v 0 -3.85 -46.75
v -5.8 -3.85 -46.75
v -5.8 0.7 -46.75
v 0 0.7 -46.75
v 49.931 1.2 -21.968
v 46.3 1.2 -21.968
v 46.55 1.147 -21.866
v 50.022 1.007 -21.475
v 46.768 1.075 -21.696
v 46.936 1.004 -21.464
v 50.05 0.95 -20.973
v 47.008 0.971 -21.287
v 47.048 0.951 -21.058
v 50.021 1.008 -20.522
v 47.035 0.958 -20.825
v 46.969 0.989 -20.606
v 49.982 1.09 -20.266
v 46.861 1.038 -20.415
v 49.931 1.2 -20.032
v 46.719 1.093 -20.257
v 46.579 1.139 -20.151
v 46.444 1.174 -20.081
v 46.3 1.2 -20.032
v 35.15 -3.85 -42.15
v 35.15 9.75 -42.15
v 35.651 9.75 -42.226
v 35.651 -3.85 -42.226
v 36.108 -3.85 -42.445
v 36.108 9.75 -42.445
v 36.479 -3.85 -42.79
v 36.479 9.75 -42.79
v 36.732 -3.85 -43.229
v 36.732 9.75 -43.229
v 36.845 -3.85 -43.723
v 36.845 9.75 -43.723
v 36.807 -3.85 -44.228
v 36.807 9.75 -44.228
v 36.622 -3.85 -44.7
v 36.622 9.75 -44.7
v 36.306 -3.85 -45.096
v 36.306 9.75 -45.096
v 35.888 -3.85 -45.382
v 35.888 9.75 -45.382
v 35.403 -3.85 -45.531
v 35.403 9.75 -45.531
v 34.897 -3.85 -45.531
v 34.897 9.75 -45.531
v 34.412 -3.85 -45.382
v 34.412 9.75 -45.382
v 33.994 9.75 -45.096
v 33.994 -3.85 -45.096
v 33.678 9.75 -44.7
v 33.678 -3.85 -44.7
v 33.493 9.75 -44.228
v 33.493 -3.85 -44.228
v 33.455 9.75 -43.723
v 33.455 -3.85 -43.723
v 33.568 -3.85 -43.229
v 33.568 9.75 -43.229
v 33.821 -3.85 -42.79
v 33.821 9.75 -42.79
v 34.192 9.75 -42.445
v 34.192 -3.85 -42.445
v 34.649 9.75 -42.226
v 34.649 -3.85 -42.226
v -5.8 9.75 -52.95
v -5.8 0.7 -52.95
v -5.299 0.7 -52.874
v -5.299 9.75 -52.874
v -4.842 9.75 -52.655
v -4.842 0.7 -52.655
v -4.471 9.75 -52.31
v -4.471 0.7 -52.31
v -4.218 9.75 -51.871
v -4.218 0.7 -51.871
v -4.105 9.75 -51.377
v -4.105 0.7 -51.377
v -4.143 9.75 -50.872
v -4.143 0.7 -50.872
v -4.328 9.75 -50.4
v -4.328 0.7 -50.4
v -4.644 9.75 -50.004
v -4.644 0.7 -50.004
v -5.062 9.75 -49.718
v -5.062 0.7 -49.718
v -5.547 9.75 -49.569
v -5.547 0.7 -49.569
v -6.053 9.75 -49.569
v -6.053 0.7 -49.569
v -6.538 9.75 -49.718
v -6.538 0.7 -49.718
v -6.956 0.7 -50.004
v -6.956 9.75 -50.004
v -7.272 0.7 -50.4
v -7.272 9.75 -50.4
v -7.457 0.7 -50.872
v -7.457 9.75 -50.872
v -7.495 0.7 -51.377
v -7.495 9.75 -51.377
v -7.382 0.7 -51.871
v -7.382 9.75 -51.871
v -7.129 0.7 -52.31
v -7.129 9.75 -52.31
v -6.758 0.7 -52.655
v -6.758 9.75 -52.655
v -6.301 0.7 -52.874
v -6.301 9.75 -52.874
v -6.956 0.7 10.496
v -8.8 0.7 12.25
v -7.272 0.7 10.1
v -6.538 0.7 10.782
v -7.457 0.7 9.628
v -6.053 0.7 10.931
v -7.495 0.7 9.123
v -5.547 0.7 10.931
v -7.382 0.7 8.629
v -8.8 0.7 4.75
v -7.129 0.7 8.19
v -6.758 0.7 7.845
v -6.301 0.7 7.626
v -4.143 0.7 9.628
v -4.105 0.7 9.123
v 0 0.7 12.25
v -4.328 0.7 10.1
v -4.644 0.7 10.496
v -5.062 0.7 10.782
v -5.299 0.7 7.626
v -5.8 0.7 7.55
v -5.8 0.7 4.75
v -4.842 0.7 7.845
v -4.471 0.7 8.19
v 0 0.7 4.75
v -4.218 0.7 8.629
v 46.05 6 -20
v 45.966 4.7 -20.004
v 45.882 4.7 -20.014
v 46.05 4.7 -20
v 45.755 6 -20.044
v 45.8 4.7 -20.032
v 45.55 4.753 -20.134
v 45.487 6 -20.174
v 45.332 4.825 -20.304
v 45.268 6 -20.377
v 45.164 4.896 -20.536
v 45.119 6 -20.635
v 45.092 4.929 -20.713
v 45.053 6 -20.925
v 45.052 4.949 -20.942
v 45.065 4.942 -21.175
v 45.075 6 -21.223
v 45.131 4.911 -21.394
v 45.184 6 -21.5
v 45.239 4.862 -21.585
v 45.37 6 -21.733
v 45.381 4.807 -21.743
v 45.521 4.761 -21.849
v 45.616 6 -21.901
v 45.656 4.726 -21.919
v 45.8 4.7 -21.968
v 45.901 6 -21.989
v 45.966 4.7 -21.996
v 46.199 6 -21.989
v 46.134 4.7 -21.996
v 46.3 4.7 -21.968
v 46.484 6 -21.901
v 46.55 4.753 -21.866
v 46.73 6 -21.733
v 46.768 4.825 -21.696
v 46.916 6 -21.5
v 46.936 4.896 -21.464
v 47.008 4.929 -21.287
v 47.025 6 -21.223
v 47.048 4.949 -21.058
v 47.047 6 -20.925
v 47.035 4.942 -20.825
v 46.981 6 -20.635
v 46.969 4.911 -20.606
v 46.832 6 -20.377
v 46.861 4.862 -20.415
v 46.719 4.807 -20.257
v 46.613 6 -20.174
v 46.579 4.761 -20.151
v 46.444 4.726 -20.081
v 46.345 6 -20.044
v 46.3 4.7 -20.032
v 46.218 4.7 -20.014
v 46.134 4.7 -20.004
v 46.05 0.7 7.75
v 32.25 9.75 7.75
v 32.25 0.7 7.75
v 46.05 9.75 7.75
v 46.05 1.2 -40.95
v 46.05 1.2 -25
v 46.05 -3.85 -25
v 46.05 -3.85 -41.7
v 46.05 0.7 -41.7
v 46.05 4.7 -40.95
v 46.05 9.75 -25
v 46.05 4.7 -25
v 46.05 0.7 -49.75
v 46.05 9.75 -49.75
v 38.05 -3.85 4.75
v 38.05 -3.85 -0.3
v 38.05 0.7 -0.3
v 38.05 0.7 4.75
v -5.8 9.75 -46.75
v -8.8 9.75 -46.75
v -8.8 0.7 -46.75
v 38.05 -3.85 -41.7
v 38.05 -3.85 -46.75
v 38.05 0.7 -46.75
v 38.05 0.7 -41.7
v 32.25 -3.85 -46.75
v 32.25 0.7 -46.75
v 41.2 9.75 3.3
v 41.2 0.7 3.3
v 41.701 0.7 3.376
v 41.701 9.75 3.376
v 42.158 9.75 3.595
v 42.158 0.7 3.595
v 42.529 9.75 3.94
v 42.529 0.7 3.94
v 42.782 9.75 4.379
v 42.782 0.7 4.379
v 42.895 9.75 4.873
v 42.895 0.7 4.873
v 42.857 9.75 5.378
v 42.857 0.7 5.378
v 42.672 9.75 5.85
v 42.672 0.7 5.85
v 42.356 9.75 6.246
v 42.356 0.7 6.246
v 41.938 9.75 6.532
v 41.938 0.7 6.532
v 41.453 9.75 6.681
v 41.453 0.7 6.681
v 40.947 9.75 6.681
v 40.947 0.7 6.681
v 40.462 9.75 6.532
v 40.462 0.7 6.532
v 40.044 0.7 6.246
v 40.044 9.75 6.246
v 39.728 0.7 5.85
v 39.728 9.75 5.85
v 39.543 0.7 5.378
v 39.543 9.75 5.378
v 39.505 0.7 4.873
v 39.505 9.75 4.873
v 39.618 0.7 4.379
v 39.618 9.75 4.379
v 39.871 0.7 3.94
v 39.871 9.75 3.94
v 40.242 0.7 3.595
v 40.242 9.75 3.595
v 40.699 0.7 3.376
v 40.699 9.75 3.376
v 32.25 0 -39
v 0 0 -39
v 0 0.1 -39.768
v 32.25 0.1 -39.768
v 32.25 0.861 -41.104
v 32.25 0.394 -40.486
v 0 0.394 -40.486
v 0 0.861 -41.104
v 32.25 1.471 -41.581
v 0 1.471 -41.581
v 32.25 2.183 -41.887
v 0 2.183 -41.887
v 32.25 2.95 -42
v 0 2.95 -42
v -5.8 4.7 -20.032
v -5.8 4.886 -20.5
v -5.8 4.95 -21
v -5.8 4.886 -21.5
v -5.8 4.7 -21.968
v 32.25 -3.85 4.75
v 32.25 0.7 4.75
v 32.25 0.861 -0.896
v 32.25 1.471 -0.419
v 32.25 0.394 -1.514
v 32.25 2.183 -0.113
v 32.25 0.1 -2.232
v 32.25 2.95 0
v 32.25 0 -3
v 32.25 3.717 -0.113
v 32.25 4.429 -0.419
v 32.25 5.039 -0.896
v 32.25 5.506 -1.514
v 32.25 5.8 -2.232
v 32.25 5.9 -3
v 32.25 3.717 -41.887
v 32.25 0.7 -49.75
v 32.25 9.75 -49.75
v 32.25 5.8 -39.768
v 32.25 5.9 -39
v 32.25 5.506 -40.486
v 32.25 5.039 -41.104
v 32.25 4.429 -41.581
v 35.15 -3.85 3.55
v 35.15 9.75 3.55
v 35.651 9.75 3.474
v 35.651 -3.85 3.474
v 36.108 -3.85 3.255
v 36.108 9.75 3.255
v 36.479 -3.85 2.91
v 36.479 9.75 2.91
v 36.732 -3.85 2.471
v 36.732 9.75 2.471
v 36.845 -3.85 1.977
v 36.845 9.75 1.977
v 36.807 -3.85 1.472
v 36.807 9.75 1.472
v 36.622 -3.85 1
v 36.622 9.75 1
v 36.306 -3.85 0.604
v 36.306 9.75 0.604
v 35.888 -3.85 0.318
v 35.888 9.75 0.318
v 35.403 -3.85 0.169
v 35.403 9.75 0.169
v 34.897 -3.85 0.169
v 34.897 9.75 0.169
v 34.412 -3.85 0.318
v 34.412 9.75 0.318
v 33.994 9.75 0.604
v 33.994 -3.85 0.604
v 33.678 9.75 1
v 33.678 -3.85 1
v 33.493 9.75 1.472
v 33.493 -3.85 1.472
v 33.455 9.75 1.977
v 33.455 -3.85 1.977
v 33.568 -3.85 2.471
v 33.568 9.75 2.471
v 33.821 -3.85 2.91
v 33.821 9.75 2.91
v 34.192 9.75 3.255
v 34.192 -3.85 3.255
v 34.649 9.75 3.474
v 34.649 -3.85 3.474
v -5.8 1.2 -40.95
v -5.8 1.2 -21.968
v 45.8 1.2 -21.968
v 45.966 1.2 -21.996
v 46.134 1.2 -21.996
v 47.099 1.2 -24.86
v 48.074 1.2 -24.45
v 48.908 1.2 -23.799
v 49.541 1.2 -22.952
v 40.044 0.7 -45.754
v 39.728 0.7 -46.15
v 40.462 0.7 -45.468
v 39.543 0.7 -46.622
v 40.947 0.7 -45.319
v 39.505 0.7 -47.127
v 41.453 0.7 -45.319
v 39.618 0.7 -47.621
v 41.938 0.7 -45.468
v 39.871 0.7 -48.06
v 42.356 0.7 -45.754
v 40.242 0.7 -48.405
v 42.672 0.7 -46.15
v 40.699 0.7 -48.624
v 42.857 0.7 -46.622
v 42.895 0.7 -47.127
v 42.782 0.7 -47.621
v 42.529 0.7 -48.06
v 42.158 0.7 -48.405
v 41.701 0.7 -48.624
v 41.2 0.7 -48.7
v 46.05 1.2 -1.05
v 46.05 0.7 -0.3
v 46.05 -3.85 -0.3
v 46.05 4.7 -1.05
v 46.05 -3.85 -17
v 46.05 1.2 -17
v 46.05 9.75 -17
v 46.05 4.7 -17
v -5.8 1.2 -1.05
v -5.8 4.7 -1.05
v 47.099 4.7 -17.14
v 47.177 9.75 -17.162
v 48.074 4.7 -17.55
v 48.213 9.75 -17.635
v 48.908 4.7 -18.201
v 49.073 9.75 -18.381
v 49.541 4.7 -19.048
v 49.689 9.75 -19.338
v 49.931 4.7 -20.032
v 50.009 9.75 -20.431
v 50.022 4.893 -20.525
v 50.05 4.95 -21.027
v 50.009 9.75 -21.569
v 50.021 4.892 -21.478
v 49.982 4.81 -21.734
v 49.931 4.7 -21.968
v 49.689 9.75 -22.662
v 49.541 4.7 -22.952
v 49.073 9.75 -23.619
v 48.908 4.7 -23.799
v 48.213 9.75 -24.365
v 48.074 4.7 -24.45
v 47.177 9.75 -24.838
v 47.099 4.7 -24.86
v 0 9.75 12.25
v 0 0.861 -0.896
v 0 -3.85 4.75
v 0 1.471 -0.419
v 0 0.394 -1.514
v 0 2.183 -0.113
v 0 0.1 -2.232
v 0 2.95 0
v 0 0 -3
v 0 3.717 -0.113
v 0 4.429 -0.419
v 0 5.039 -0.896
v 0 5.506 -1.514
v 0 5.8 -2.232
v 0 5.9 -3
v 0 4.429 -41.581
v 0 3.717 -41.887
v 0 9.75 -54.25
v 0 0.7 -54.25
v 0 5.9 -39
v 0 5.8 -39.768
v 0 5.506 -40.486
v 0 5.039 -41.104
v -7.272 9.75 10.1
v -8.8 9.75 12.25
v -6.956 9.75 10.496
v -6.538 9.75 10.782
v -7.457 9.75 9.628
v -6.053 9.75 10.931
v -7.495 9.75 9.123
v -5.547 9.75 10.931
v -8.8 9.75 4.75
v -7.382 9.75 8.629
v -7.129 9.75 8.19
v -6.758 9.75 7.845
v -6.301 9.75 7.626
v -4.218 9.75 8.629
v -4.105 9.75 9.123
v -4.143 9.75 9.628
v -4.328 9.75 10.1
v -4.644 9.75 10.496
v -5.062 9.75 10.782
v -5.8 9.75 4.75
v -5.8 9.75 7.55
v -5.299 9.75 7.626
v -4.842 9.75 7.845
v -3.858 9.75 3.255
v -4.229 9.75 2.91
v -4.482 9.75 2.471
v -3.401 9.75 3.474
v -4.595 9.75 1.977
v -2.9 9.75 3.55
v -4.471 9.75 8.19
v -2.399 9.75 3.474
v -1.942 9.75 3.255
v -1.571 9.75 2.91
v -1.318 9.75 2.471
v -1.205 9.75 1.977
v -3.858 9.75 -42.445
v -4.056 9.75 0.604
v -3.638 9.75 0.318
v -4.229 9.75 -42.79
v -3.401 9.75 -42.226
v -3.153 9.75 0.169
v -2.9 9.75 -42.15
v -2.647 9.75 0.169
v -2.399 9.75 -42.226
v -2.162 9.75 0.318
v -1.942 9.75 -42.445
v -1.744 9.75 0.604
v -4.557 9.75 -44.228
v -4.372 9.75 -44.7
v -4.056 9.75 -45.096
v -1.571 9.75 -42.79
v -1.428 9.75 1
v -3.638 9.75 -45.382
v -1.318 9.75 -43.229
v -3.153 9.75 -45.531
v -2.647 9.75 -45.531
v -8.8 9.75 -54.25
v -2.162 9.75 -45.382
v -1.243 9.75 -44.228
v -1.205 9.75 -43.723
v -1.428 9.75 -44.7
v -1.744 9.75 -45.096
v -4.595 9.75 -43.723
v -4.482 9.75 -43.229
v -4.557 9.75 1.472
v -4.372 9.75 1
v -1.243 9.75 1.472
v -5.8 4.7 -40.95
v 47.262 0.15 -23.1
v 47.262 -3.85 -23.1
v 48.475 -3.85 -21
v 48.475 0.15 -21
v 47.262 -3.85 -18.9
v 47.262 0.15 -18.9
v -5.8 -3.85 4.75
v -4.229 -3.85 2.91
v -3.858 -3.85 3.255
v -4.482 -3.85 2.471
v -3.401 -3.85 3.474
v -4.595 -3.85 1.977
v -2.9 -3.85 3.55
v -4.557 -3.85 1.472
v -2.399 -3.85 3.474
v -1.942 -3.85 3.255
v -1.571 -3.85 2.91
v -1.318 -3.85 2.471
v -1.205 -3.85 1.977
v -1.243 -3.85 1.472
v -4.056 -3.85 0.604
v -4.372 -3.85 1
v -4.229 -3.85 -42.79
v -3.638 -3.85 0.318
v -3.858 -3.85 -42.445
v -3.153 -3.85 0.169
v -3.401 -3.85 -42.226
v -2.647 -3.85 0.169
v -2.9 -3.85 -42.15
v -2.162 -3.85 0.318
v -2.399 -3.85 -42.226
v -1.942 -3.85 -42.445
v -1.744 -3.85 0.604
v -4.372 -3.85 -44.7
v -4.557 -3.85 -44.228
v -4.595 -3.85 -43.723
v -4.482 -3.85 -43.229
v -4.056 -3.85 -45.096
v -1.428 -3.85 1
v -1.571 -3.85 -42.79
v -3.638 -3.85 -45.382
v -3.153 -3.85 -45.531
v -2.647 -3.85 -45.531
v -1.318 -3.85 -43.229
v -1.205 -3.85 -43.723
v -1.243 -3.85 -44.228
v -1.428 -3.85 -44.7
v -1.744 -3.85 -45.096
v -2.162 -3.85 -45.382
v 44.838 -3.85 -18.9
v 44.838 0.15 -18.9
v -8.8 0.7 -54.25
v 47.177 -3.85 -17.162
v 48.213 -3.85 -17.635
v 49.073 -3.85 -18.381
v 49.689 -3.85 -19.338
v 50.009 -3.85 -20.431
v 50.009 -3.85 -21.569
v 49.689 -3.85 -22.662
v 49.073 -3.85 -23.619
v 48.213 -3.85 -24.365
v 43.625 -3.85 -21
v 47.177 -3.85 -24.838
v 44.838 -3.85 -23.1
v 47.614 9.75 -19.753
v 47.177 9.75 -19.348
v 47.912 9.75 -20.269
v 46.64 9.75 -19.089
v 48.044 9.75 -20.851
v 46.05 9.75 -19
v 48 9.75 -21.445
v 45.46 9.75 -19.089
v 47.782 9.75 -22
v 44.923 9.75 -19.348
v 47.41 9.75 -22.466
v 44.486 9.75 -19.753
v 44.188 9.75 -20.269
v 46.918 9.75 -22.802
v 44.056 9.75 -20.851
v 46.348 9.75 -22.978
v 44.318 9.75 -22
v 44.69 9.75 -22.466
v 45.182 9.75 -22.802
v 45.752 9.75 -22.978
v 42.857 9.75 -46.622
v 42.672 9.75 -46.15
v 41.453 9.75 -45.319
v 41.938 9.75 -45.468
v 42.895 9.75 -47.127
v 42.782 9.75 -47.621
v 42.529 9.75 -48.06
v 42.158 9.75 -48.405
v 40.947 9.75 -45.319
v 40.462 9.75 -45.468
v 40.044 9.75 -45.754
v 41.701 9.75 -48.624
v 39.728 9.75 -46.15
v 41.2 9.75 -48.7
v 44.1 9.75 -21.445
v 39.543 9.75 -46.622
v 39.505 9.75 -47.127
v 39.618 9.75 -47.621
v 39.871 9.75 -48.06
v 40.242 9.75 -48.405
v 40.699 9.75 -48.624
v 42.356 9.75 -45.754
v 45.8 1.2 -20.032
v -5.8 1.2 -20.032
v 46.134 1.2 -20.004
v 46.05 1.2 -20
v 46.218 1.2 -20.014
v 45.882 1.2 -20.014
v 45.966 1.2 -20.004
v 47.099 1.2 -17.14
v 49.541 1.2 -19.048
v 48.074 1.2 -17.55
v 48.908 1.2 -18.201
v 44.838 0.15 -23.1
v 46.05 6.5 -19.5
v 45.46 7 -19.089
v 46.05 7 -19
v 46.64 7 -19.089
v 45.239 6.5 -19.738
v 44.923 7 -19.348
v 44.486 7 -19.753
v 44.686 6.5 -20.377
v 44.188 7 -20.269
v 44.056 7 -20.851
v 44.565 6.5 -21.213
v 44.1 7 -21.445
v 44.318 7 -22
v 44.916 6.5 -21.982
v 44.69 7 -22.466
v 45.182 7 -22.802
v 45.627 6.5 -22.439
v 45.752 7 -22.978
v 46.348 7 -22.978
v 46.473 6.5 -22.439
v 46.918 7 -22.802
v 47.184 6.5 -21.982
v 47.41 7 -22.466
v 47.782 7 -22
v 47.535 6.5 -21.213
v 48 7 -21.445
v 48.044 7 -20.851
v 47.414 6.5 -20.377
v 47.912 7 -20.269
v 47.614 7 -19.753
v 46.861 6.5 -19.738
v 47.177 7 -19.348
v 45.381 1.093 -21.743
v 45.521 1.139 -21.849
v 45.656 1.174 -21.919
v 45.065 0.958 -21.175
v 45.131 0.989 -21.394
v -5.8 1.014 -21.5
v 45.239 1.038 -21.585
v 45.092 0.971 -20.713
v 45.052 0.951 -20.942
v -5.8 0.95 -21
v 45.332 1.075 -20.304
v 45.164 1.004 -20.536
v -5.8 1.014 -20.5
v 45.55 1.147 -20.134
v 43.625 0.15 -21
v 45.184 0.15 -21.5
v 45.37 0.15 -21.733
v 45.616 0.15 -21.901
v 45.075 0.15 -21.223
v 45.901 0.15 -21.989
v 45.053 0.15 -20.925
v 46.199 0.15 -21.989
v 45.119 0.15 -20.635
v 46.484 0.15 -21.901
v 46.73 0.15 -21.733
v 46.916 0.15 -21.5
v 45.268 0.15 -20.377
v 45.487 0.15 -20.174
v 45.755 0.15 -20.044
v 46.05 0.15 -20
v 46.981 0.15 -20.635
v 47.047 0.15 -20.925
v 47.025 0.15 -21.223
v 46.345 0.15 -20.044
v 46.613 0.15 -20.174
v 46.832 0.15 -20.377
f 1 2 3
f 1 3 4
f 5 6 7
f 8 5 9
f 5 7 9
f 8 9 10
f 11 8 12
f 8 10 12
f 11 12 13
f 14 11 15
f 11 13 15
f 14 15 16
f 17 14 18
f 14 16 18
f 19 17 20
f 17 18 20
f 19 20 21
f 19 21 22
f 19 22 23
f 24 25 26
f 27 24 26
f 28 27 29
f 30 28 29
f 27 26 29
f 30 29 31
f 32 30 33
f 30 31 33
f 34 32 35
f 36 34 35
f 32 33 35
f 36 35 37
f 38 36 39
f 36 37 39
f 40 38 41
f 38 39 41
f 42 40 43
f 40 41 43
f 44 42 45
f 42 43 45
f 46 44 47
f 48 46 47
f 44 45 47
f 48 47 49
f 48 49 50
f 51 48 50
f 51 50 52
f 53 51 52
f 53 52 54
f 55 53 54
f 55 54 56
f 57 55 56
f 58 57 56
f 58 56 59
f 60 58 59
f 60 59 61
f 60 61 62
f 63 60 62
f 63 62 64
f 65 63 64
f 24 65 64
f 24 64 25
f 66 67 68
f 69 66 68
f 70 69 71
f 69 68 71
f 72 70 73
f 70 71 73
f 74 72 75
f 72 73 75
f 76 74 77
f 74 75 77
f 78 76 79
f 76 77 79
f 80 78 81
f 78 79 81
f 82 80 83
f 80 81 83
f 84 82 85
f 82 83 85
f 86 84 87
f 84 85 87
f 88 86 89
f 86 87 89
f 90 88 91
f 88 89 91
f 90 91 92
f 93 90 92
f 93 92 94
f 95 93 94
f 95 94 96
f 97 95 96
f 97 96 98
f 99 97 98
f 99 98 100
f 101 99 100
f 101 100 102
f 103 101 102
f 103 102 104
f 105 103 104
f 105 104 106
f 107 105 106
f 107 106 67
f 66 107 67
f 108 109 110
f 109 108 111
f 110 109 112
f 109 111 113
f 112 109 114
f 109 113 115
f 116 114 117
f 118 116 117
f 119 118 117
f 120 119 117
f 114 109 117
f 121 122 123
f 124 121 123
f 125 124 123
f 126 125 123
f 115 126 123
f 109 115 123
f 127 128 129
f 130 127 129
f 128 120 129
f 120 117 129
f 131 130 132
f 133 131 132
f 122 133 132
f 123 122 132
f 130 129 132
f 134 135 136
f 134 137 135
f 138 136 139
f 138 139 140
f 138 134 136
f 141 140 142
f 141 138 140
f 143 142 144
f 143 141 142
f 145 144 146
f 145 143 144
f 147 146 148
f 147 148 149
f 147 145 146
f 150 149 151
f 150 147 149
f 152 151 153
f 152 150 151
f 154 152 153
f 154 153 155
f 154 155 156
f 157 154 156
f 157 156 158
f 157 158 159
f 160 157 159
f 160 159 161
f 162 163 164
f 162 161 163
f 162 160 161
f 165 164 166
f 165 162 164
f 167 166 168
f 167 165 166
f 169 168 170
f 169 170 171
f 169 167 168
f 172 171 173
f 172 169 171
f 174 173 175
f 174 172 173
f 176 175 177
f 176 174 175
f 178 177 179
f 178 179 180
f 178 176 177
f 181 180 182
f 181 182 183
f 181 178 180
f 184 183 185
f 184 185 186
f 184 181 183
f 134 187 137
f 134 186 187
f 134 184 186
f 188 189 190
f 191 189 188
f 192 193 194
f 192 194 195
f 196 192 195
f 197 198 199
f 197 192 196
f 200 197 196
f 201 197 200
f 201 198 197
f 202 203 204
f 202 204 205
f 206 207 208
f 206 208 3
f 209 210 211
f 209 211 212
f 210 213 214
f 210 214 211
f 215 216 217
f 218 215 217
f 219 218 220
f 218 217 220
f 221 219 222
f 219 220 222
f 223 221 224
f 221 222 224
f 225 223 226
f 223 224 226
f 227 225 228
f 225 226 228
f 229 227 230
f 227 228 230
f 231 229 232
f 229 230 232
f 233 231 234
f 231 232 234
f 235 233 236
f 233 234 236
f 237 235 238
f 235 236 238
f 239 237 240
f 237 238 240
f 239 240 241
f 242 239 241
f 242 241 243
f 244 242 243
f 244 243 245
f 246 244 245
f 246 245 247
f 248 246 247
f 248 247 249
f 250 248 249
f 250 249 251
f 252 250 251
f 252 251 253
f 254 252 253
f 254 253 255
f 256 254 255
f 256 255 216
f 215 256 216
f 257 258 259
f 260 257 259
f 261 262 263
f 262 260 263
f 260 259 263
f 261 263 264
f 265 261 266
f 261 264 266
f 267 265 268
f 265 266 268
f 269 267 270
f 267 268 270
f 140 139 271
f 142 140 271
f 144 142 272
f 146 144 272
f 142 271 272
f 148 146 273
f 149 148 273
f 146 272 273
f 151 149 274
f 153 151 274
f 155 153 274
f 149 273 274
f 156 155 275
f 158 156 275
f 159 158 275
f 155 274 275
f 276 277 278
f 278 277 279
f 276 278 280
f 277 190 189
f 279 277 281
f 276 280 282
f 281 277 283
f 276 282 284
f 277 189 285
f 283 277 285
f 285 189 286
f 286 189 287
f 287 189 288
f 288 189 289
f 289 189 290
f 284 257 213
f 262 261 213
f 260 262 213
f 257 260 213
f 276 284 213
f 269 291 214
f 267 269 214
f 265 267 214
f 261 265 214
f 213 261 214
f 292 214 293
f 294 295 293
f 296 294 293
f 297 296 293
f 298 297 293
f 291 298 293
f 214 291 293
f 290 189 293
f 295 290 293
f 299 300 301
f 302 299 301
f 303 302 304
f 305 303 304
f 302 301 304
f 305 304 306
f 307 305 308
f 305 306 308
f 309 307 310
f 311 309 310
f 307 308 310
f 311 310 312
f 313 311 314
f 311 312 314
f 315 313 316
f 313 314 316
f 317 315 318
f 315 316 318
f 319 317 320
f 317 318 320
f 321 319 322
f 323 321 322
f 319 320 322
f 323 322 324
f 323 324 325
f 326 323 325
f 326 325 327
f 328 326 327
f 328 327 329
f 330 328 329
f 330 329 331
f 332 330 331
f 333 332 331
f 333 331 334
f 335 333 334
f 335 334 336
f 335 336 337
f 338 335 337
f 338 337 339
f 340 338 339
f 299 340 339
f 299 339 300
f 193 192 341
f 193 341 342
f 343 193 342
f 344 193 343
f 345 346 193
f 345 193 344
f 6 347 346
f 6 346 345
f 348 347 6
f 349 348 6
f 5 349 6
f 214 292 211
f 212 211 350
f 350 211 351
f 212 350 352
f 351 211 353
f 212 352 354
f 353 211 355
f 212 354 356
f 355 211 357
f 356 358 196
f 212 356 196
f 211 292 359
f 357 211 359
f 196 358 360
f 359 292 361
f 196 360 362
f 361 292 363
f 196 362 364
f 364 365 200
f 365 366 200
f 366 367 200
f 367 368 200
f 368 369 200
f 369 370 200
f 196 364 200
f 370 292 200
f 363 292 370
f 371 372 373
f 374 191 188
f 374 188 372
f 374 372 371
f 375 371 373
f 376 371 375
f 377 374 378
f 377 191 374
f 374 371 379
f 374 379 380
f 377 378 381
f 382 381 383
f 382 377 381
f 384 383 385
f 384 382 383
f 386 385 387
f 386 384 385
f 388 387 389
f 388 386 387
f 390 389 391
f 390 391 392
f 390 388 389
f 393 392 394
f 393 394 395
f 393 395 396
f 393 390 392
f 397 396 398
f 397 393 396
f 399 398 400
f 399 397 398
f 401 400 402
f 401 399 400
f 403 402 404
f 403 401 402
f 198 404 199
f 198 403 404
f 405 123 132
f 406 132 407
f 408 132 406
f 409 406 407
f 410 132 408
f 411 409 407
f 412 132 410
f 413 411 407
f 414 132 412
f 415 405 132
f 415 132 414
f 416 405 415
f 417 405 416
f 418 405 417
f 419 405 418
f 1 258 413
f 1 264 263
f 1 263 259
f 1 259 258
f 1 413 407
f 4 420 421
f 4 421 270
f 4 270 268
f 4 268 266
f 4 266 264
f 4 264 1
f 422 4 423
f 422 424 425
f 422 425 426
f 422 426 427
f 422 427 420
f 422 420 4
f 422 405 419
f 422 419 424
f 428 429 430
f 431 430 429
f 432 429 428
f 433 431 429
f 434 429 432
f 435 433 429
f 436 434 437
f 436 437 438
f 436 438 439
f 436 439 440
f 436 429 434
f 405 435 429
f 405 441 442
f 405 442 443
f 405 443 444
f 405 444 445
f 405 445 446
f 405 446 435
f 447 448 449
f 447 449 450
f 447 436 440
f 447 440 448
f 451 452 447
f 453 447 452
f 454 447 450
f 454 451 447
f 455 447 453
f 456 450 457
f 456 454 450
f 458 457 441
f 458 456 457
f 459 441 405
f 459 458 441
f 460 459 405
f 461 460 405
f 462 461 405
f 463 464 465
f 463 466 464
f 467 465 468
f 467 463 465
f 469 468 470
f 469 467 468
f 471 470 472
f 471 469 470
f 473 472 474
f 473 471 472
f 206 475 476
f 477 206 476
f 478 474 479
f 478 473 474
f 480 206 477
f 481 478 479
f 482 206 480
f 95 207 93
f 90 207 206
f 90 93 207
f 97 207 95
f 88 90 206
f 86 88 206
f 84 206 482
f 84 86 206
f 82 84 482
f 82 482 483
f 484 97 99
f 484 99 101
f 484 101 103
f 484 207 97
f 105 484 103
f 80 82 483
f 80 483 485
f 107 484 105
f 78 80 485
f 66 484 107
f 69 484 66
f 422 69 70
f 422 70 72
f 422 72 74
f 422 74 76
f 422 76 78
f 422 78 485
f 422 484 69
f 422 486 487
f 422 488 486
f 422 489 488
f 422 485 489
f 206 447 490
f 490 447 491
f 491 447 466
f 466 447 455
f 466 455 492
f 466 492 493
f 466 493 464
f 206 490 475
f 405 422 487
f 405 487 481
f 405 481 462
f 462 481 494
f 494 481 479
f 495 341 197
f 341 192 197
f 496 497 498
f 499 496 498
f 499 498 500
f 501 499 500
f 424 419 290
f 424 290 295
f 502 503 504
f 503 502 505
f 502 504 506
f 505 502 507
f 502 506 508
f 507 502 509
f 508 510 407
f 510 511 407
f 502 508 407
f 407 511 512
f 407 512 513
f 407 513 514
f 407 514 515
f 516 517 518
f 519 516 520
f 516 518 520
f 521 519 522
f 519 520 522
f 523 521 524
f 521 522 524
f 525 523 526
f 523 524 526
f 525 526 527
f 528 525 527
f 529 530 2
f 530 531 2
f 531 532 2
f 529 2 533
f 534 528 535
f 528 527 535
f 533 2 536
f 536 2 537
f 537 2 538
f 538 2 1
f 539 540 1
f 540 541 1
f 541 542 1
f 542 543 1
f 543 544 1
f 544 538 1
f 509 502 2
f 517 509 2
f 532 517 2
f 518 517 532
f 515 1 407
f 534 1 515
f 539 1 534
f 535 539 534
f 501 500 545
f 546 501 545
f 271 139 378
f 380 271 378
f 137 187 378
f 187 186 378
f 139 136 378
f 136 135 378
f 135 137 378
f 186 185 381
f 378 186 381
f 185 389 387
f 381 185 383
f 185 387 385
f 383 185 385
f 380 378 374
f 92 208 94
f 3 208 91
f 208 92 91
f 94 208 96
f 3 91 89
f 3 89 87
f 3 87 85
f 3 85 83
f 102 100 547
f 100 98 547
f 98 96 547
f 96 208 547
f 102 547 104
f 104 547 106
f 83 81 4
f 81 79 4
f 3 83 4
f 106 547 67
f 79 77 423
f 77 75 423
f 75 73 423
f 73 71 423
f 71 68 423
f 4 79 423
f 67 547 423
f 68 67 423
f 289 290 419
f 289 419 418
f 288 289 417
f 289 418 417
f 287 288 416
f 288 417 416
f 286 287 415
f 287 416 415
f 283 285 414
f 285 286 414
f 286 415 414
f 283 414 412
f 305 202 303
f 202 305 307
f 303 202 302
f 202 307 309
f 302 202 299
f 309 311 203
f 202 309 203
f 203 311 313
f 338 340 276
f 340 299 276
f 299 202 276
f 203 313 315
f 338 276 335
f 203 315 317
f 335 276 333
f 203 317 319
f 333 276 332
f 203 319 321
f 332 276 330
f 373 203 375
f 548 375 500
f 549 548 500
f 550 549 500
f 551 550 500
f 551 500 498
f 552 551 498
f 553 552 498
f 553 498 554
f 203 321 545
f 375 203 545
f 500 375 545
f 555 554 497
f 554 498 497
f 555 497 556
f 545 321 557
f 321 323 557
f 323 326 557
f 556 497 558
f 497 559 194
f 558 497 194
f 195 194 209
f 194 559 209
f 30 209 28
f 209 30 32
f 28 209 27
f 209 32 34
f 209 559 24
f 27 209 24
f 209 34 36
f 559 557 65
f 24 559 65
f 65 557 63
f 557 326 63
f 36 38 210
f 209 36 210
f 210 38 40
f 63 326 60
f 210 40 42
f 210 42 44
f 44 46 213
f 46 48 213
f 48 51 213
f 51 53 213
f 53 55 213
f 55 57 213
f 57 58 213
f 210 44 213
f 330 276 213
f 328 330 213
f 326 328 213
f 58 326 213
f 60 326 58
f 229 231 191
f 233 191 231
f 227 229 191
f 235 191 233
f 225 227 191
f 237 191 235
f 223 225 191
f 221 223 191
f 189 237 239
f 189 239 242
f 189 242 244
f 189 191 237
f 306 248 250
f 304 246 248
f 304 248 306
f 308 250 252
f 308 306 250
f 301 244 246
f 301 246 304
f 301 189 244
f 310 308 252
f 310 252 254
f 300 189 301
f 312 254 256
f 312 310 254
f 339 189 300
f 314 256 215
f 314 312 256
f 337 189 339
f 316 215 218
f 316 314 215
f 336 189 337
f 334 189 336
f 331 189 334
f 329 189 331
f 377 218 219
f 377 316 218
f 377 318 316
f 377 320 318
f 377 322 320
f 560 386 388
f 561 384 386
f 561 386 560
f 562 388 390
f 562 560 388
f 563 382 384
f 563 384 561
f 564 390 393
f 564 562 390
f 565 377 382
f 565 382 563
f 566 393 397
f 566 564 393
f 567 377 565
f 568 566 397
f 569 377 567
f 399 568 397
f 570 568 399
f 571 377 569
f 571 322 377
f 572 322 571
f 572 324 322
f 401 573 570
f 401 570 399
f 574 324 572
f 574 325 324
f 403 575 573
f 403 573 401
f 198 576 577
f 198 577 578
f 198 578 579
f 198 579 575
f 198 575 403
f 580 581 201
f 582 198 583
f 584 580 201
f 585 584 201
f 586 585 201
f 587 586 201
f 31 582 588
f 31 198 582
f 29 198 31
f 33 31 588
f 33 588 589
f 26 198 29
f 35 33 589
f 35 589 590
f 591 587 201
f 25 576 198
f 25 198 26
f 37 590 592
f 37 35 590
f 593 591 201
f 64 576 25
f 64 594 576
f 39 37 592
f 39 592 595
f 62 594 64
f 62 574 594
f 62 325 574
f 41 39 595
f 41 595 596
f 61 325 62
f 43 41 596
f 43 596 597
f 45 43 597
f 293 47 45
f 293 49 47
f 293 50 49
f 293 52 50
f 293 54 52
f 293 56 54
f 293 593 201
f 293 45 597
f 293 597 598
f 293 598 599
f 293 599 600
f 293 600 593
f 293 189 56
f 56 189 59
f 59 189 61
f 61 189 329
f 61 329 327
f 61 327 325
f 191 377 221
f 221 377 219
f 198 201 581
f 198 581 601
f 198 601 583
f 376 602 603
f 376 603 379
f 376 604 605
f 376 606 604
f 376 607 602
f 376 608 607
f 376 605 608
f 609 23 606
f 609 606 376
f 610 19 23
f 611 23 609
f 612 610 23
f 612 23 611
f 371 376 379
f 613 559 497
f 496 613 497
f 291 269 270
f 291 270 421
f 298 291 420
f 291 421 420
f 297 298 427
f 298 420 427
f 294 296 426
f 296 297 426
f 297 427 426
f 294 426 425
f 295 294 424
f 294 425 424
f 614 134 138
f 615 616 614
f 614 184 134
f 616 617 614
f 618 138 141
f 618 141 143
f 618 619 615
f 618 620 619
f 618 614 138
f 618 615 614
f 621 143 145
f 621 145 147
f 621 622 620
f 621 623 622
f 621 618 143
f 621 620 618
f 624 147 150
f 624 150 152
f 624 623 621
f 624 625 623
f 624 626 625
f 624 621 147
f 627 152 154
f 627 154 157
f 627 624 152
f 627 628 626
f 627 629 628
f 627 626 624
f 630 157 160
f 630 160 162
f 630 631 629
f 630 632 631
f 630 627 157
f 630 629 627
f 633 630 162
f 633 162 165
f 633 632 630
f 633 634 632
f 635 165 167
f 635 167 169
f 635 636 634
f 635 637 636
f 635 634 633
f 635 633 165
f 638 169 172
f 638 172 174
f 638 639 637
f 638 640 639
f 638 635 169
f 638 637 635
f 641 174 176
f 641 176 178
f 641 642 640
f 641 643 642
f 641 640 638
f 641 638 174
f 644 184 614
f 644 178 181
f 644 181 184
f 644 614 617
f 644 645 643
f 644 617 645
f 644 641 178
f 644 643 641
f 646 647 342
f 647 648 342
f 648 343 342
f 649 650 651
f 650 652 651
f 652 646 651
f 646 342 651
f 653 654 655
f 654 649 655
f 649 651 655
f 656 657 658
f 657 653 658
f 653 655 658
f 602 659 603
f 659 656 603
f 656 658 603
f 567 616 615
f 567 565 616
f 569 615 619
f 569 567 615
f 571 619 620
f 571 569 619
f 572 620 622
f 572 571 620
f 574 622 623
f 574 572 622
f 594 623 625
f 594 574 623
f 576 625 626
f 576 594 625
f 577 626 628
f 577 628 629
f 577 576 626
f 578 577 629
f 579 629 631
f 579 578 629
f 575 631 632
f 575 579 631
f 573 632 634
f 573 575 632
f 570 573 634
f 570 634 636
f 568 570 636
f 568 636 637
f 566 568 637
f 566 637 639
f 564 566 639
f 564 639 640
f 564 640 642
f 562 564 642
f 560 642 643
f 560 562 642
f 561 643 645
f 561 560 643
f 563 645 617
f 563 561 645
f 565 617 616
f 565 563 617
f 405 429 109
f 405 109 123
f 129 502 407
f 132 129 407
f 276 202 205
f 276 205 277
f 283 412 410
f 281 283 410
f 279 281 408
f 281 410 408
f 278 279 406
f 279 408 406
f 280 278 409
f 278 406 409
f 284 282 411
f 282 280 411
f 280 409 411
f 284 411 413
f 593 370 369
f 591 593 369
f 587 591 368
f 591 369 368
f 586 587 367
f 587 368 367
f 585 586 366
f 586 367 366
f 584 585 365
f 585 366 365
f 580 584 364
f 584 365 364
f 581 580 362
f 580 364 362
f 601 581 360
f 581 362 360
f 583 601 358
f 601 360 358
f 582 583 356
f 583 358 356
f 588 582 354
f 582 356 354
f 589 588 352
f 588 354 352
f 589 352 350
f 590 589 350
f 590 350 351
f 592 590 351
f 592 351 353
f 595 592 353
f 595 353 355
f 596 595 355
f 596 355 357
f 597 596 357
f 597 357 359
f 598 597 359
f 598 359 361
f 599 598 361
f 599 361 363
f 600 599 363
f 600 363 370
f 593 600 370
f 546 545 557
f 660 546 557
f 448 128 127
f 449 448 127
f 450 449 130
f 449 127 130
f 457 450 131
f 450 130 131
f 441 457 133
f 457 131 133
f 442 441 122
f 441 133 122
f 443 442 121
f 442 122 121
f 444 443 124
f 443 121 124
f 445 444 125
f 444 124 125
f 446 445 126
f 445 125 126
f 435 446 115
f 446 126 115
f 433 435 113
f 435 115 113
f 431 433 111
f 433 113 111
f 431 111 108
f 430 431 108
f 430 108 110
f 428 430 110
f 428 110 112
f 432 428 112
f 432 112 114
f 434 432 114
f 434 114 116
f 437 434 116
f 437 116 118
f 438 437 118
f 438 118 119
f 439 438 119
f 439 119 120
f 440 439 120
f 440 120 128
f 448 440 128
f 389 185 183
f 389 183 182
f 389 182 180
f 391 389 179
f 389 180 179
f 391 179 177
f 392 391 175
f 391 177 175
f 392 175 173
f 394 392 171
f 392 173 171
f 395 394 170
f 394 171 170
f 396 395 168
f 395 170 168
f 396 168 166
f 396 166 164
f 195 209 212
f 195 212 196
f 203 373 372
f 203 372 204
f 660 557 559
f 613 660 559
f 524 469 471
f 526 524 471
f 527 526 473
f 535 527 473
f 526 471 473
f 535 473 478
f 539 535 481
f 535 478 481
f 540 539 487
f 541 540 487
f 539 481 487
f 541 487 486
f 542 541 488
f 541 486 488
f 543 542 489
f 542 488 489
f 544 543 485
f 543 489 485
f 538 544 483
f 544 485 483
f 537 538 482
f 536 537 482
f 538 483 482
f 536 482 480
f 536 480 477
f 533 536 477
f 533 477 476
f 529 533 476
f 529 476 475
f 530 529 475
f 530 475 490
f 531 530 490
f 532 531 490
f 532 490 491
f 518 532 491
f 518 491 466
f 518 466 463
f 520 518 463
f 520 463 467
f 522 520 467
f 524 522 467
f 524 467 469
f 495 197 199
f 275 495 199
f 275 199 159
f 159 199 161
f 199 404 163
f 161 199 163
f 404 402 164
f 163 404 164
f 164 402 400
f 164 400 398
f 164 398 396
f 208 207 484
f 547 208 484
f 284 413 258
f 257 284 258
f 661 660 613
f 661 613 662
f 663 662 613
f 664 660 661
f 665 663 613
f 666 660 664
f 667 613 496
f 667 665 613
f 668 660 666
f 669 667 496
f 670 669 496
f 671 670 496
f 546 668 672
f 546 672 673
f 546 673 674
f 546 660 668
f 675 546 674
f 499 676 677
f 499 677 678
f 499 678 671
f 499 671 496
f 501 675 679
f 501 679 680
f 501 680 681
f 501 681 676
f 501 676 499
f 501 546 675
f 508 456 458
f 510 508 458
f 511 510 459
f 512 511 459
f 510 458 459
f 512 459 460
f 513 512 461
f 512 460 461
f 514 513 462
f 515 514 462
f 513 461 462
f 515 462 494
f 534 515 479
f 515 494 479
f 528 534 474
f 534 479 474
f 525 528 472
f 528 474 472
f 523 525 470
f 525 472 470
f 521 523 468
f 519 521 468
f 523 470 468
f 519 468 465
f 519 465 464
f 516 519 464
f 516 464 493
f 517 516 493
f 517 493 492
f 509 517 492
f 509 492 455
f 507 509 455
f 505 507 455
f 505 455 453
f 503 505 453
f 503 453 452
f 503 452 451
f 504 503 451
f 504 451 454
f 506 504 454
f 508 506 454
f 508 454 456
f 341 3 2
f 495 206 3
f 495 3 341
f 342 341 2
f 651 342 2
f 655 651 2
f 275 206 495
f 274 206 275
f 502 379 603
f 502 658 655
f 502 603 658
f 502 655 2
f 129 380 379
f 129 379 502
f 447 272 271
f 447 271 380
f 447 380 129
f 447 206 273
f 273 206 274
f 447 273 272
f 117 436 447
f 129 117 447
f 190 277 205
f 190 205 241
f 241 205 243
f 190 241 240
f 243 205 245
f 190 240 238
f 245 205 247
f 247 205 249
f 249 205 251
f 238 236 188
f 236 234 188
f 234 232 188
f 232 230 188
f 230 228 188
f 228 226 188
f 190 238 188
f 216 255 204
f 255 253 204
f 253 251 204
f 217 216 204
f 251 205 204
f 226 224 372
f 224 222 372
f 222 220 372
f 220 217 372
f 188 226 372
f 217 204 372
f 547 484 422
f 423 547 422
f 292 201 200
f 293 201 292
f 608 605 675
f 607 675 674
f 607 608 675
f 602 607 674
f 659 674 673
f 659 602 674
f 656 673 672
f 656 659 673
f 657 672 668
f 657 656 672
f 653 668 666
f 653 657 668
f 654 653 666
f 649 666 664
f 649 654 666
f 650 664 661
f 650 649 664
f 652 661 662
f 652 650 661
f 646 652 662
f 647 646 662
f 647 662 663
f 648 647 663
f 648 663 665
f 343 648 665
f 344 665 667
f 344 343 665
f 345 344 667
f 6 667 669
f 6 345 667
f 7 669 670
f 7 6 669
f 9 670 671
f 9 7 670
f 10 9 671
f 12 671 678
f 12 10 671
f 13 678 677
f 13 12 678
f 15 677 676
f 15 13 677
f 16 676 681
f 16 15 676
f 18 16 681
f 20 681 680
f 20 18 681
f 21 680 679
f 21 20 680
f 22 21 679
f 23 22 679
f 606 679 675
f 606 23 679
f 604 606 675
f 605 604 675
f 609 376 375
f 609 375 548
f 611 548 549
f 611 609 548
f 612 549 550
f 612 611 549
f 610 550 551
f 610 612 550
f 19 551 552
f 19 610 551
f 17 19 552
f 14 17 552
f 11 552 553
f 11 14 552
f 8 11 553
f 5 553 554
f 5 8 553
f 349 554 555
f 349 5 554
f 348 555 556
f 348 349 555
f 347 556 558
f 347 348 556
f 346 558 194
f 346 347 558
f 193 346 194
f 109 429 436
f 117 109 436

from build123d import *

# Parameters (mm, degrees)
SKETCH1_W              = 42
SKETCH1_H              = 5.9
SKETCH1_W_2            = 39.9
SKETCH1_H_2            = 3.5
BOSS_EXTRUDE1_DEPTH    = 32.25
FILLET2_R              = 3
SKETCH2_W              = 51.5
SKETCH2_H              = 13.6
SKETCH2_W_2            = 39.9
SKETCH2_H_2            = 3.5
BOSS_EXTRUDE2_DEPTH    = 5.8
SKETCH3_W              = 51.5
SKETCH3_H              = 13.6
SKETCH3_W_2            = 39.9
SKETCH3_H_2            = 3.5
BOSS_EXTRUDE3_DEPTH    = 5.8
SKETCH4_R              = 1.7
CUT_EXTRUDE1_DEPTH     = 62.792596644
SKETCH8_W              = 8.8
SKETCH8_H              = 7.5
BOSS_EXTRUDE4_DEPTH    = 13.6
CUT_EXTRUDE4_DEPTH     = 4
SKETCH15_W             = 39.9
SKETCH15_H             = 3.5
CUT_EXTRUDE5_DEPTH     = 79.468767672
SKETCH17_R             = 2
CUT_EXTRUDE6_DEPTH     = 79.468767672
M3_CLEARANCE_HOLE1_D   = 3.4
CUT_EXTRUDE8_START     = -13.6
CUT_EXTRUDE8_OUTLINE_W = 8.8
CUT_EXTRUDE8_OUTLINE_H = 7.5
CUT_EXTRUDE8_OUTLINE_R = 1.7
CUT_EXTRUDE8_DEPTH     = 4.55


# Read off the part's stored shape, not the designer's step: Cut-Extrude8
with BuildPart() as part:
    # Sketch1 → Boss-Extrude1 (new body)
    with BuildSketch(Plane(origin=(0, 0, 0), x_dir=(0, 0, -1), z_dir=(1, 0, 0))):
        with Locations((21, 2.95)):
            Rectangle(SKETCH1_W, SKETCH1_H)
        with Locations((21, 2.95)):
            Rectangle(SKETCH1_W_2, SKETCH1_H_2, mode=Mode.SUBTRACT)
    extrude(amount=BOSS_EXTRUDE1_DEPTH)

    # Fillet2
    # the kernel refuses this fillet: 3 mm, written as the material it takes off along each edge
    with BuildSketch(Plane(origin=(-7.5, 0, -42), x_dir=(0, 0, 1), z_dir=(1, 0, 0)), Plane(origin=(-7.5, 5.9, 0), x_dir=(0, 0, -1), z_dir=(1, 0, 0)), Plane(origin=(-7.5, 5.9, -42), x_dir=(0, -1, 0), z_dir=(1, 0, 0))) as fillet2_piece_1:
        with BuildLine():
            CenterArc((FILLET2_R, -FILLET2_R), FILLET2_R, 90, 90)
            Line((0, -FILLET2_R), (0, 0))
            Line((0, 0), (FILLET2_R, 0))
        make_face()
    extrude(amount=47.25, mode=Mode.SUBTRACT)
    with BuildSketch(Plane(origin=(-7.5, 0, 0), x_dir=(0, 0, -1), z_dir=(1, 0, 0))) as fillet2_piece_2:
        with BuildLine():
            CenterArc((FILLET2_R, FILLET2_R), FILLET2_R, 180, 90)
            Line((0, FILLET2_R), (0, 0))
            Line((0, 0), (FILLET2_R, 0))
        make_face()
    extrude(amount=47.25, mode=Mode.SUBTRACT)

    # Sketch2 → Boss-Extrude2 (add)
    with BuildSketch(Plane(origin=(32.25, 0, 0), x_dir=(0, 0, -1), z_dir=(1, 0, 0))):
        with Locations((21, 2.95)):
            Rectangle(SKETCH2_W, SKETCH2_H)
        with Locations((21, 2.95)):
            Rectangle(SKETCH2_W_2, SKETCH2_H_2, mode=Mode.SUBTRACT)
    extrude(amount=BOSS_EXTRUDE2_DEPTH)

    # Sketch3 → Boss-Extrude3 (add)
    with BuildSketch(Plane.ZY):
        with Locations((-21, 2.95)):
            Rectangle(SKETCH3_W, SKETCH3_H)
        with Locations((-21, 2.95)):
            Rectangle(SKETCH3_W_2, SKETCH3_H_2, mode=Mode.SUBTRACT)
    extrude(amount=BOSS_EXTRUDE3_DEPTH)

    # Sketch4 → Cut-Extrude1 (cut, through all)
    with BuildSketch(Plane(origin=(0, 9.75, 0), x_dir=(1, 0, 0), z_dir=(0, 1, 0))):
        with Locations(Location((-2.9, 43.85, 0), (0, 0, 270))):
            Circle(SKETCH4_R)
        with Locations(Location((35.15, 43.85, 0), (0, 0, 270))):
            Circle(SKETCH4_R)
        with Locations(Location((-2.9, -1.85, 0), (0, 0, 270))):
            Circle(SKETCH4_R)
        with Locations(Location((35.15, -1.85, 0), (0, 0, 270))):
            Circle(SKETCH4_R)
    extrude(amount=-CUT_EXTRUDE1_DEPTH, mode=Mode.SUBTRACT)

    # Sketch8 → Boss-Extrude4 (add)
    with BuildSketch(Plane(origin=(0, 9.75, 0), x_dir=(1, 0, 0), z_dir=(0, 1, 0))):
        with Locations((-4.4, 50.5)):
            Rectangle(SKETCH8_W, SKETCH8_H)
        with Locations((-4.4, -8.5)):
            Rectangle(SKETCH8_W, SKETCH8_H)
        with BuildLine():
            Line((46.05, 25), (46.05, 49.75))
            Line((46.05, 49.75), (32.25, 49.75))
            Line((32.25, 49.75), (32.25, 46.75))
            Line((32.25, 46.75), (38.05, 46.75))
            Line((38.05, 46.75), (38.05, -4.75))
            Line((38.05, -4.75), (32.25, -4.75))
            Line((32.25, -4.75), (32.25, -7.75))
            Line((32.25, -7.75), (46.05, -7.75))
            Line((46.05, -7.75), (46.05, 17))
            ThreePointArc((46.05, 17), (50.05, 21), (46.05, 25))
        make_face()
    extrude(amount=-BOSS_EXTRUDE4_DEPTH)

    # Sketch13 → CSK for M2 Flat Head Machine Screw1 (revolve, cut)
    with BuildSketch(Plane(origin=(46.05, 9.75, -21), x_dir=(0, 0, 1), z_dir=(1, 0, 0))):
        Polygon((0, 0), (0, 13.6), (1, 13.6), (1, 3.75), (2, 2.75), (2, 0), align=None)
    revolve(axis=Axis((46.05, 16.1, -21), (0, -1, 0)), mode=Mode.SUBTRACT)

    # Sketch14 → Cut-Extrude4 (cut)
    with BuildSketch(Plane.XZ.offset(3.85)):
        Polygon((43.625128869, -21), (44.837564435, -23.1), (47.262435565, -23.1), (48.474871131, -21), (47.262435565, -18.9), (44.837564435, -18.9), align=None)
    extrude(amount=-CUT_EXTRUDE4_DEPTH, mode=Mode.SUBTRACT)

    # Sketch15 → Cut-Extrude5 (cut, through all)
    with BuildSketch(Plane.ZY.offset(5.8)):
        with Locations((-21, 2.95)):
            Rectangle(SKETCH15_W, SKETCH15_H)
    extrude(amount=-CUT_EXTRUDE5_DEPTH, mode=Mode.SUBTRACT)

    # Sketch17 → Cut-Extrude6 (cut, through all)
    with BuildSketch(Plane.ZY.offset(5.8)):
        with Locations((-21, 2.95)):
            Circle(SKETCH17_R)
    extrude(amount=-CUT_EXTRUDE6_DEPTH, mode=Mode.SUBTRACT)

    # M3 Clearance Hole1 (through all)
    with Locations(Plane(origin=(-5.8, 9.75, -51.25), x_dir=(0, 0, 1), z_dir=(0, 1, 0))):
        with Locations((0, 0), (4.25, 47), (56.25, 47), (60.5, 0)):
            Hole(M3_CLEARANCE_HOLE1_D / 2)

    # Cut-Extrude8 outline → Cut-Extrude8 (cut)
    # profile 1 of 4: a face of its own
    with BuildSketch(Plane(origin=(0, 9.75, 0), x_dir=(1, 0, 0), z_dir=(0, 1, 0)).offset(CUT_EXTRUDE8_START)):
        with Locations((-4.4, 50.5)):
            Rectangle(CUT_EXTRUDE8_OUTLINE_W, CUT_EXTRUDE8_OUTLINE_H)
        with Locations((-5.8, 51.25)):
            Circle(CUT_EXTRUDE8_OUTLINE_R, mode=Mode.SUBTRACT)
    # profile 2 of 4: a face of its own
    with BuildSketch(Plane(origin=(0, 9.75, 0), x_dir=(1, 0, 0), z_dir=(0, 1, 0)).offset(CUT_EXTRUDE8_START)):
        with Locations((-4.4, -8.5)):
            Rectangle(CUT_EXTRUDE8_OUTLINE_W, CUT_EXTRUDE8_OUTLINE_H)
        with Locations((-5.8, -9.25)):
            Circle(CUT_EXTRUDE8_OUTLINE_R, mode=Mode.SUBTRACT)
    # profile 3 of 4: a face of its own
    with BuildSketch(Plane(origin=(0, 9.75, 0), x_dir=(1, 0, 0), z_dir=(0, 1, 0)).offset(CUT_EXTRUDE8_START)):
        Polygon((32.25, 49.75), (32.25, 46.75), (38.05, 46.75), (38.05, 41.7), (46.05, 41.7), (46.05, 49.75), align=None)
        with Locations((41.2, 47)):
            Circle(CUT_EXTRUDE8_OUTLINE_R, mode=Mode.SUBTRACT)
    # profile 4 of 4: a face of its own
    with BuildSketch(Plane(origin=(0, 9.75, 0), x_dir=(1, 0, 0), z_dir=(0, 1, 0)).offset(CUT_EXTRUDE8_START)):
        Polygon((38.05, -4.75), (32.25, -4.75), (32.25, -7.75), (46.05, -7.75), (46.05, 0.3), (38.05, 0.3), align=None)
        with Locations((41.2, -5)):
            Circle(CUT_EXTRUDE8_OUTLINE_R, mode=Mode.SUBTRACT)
    extrude(amount=CUT_EXTRUDE8_DEPTH, mode=Mode.SUBTRACT)


solid = part.part
